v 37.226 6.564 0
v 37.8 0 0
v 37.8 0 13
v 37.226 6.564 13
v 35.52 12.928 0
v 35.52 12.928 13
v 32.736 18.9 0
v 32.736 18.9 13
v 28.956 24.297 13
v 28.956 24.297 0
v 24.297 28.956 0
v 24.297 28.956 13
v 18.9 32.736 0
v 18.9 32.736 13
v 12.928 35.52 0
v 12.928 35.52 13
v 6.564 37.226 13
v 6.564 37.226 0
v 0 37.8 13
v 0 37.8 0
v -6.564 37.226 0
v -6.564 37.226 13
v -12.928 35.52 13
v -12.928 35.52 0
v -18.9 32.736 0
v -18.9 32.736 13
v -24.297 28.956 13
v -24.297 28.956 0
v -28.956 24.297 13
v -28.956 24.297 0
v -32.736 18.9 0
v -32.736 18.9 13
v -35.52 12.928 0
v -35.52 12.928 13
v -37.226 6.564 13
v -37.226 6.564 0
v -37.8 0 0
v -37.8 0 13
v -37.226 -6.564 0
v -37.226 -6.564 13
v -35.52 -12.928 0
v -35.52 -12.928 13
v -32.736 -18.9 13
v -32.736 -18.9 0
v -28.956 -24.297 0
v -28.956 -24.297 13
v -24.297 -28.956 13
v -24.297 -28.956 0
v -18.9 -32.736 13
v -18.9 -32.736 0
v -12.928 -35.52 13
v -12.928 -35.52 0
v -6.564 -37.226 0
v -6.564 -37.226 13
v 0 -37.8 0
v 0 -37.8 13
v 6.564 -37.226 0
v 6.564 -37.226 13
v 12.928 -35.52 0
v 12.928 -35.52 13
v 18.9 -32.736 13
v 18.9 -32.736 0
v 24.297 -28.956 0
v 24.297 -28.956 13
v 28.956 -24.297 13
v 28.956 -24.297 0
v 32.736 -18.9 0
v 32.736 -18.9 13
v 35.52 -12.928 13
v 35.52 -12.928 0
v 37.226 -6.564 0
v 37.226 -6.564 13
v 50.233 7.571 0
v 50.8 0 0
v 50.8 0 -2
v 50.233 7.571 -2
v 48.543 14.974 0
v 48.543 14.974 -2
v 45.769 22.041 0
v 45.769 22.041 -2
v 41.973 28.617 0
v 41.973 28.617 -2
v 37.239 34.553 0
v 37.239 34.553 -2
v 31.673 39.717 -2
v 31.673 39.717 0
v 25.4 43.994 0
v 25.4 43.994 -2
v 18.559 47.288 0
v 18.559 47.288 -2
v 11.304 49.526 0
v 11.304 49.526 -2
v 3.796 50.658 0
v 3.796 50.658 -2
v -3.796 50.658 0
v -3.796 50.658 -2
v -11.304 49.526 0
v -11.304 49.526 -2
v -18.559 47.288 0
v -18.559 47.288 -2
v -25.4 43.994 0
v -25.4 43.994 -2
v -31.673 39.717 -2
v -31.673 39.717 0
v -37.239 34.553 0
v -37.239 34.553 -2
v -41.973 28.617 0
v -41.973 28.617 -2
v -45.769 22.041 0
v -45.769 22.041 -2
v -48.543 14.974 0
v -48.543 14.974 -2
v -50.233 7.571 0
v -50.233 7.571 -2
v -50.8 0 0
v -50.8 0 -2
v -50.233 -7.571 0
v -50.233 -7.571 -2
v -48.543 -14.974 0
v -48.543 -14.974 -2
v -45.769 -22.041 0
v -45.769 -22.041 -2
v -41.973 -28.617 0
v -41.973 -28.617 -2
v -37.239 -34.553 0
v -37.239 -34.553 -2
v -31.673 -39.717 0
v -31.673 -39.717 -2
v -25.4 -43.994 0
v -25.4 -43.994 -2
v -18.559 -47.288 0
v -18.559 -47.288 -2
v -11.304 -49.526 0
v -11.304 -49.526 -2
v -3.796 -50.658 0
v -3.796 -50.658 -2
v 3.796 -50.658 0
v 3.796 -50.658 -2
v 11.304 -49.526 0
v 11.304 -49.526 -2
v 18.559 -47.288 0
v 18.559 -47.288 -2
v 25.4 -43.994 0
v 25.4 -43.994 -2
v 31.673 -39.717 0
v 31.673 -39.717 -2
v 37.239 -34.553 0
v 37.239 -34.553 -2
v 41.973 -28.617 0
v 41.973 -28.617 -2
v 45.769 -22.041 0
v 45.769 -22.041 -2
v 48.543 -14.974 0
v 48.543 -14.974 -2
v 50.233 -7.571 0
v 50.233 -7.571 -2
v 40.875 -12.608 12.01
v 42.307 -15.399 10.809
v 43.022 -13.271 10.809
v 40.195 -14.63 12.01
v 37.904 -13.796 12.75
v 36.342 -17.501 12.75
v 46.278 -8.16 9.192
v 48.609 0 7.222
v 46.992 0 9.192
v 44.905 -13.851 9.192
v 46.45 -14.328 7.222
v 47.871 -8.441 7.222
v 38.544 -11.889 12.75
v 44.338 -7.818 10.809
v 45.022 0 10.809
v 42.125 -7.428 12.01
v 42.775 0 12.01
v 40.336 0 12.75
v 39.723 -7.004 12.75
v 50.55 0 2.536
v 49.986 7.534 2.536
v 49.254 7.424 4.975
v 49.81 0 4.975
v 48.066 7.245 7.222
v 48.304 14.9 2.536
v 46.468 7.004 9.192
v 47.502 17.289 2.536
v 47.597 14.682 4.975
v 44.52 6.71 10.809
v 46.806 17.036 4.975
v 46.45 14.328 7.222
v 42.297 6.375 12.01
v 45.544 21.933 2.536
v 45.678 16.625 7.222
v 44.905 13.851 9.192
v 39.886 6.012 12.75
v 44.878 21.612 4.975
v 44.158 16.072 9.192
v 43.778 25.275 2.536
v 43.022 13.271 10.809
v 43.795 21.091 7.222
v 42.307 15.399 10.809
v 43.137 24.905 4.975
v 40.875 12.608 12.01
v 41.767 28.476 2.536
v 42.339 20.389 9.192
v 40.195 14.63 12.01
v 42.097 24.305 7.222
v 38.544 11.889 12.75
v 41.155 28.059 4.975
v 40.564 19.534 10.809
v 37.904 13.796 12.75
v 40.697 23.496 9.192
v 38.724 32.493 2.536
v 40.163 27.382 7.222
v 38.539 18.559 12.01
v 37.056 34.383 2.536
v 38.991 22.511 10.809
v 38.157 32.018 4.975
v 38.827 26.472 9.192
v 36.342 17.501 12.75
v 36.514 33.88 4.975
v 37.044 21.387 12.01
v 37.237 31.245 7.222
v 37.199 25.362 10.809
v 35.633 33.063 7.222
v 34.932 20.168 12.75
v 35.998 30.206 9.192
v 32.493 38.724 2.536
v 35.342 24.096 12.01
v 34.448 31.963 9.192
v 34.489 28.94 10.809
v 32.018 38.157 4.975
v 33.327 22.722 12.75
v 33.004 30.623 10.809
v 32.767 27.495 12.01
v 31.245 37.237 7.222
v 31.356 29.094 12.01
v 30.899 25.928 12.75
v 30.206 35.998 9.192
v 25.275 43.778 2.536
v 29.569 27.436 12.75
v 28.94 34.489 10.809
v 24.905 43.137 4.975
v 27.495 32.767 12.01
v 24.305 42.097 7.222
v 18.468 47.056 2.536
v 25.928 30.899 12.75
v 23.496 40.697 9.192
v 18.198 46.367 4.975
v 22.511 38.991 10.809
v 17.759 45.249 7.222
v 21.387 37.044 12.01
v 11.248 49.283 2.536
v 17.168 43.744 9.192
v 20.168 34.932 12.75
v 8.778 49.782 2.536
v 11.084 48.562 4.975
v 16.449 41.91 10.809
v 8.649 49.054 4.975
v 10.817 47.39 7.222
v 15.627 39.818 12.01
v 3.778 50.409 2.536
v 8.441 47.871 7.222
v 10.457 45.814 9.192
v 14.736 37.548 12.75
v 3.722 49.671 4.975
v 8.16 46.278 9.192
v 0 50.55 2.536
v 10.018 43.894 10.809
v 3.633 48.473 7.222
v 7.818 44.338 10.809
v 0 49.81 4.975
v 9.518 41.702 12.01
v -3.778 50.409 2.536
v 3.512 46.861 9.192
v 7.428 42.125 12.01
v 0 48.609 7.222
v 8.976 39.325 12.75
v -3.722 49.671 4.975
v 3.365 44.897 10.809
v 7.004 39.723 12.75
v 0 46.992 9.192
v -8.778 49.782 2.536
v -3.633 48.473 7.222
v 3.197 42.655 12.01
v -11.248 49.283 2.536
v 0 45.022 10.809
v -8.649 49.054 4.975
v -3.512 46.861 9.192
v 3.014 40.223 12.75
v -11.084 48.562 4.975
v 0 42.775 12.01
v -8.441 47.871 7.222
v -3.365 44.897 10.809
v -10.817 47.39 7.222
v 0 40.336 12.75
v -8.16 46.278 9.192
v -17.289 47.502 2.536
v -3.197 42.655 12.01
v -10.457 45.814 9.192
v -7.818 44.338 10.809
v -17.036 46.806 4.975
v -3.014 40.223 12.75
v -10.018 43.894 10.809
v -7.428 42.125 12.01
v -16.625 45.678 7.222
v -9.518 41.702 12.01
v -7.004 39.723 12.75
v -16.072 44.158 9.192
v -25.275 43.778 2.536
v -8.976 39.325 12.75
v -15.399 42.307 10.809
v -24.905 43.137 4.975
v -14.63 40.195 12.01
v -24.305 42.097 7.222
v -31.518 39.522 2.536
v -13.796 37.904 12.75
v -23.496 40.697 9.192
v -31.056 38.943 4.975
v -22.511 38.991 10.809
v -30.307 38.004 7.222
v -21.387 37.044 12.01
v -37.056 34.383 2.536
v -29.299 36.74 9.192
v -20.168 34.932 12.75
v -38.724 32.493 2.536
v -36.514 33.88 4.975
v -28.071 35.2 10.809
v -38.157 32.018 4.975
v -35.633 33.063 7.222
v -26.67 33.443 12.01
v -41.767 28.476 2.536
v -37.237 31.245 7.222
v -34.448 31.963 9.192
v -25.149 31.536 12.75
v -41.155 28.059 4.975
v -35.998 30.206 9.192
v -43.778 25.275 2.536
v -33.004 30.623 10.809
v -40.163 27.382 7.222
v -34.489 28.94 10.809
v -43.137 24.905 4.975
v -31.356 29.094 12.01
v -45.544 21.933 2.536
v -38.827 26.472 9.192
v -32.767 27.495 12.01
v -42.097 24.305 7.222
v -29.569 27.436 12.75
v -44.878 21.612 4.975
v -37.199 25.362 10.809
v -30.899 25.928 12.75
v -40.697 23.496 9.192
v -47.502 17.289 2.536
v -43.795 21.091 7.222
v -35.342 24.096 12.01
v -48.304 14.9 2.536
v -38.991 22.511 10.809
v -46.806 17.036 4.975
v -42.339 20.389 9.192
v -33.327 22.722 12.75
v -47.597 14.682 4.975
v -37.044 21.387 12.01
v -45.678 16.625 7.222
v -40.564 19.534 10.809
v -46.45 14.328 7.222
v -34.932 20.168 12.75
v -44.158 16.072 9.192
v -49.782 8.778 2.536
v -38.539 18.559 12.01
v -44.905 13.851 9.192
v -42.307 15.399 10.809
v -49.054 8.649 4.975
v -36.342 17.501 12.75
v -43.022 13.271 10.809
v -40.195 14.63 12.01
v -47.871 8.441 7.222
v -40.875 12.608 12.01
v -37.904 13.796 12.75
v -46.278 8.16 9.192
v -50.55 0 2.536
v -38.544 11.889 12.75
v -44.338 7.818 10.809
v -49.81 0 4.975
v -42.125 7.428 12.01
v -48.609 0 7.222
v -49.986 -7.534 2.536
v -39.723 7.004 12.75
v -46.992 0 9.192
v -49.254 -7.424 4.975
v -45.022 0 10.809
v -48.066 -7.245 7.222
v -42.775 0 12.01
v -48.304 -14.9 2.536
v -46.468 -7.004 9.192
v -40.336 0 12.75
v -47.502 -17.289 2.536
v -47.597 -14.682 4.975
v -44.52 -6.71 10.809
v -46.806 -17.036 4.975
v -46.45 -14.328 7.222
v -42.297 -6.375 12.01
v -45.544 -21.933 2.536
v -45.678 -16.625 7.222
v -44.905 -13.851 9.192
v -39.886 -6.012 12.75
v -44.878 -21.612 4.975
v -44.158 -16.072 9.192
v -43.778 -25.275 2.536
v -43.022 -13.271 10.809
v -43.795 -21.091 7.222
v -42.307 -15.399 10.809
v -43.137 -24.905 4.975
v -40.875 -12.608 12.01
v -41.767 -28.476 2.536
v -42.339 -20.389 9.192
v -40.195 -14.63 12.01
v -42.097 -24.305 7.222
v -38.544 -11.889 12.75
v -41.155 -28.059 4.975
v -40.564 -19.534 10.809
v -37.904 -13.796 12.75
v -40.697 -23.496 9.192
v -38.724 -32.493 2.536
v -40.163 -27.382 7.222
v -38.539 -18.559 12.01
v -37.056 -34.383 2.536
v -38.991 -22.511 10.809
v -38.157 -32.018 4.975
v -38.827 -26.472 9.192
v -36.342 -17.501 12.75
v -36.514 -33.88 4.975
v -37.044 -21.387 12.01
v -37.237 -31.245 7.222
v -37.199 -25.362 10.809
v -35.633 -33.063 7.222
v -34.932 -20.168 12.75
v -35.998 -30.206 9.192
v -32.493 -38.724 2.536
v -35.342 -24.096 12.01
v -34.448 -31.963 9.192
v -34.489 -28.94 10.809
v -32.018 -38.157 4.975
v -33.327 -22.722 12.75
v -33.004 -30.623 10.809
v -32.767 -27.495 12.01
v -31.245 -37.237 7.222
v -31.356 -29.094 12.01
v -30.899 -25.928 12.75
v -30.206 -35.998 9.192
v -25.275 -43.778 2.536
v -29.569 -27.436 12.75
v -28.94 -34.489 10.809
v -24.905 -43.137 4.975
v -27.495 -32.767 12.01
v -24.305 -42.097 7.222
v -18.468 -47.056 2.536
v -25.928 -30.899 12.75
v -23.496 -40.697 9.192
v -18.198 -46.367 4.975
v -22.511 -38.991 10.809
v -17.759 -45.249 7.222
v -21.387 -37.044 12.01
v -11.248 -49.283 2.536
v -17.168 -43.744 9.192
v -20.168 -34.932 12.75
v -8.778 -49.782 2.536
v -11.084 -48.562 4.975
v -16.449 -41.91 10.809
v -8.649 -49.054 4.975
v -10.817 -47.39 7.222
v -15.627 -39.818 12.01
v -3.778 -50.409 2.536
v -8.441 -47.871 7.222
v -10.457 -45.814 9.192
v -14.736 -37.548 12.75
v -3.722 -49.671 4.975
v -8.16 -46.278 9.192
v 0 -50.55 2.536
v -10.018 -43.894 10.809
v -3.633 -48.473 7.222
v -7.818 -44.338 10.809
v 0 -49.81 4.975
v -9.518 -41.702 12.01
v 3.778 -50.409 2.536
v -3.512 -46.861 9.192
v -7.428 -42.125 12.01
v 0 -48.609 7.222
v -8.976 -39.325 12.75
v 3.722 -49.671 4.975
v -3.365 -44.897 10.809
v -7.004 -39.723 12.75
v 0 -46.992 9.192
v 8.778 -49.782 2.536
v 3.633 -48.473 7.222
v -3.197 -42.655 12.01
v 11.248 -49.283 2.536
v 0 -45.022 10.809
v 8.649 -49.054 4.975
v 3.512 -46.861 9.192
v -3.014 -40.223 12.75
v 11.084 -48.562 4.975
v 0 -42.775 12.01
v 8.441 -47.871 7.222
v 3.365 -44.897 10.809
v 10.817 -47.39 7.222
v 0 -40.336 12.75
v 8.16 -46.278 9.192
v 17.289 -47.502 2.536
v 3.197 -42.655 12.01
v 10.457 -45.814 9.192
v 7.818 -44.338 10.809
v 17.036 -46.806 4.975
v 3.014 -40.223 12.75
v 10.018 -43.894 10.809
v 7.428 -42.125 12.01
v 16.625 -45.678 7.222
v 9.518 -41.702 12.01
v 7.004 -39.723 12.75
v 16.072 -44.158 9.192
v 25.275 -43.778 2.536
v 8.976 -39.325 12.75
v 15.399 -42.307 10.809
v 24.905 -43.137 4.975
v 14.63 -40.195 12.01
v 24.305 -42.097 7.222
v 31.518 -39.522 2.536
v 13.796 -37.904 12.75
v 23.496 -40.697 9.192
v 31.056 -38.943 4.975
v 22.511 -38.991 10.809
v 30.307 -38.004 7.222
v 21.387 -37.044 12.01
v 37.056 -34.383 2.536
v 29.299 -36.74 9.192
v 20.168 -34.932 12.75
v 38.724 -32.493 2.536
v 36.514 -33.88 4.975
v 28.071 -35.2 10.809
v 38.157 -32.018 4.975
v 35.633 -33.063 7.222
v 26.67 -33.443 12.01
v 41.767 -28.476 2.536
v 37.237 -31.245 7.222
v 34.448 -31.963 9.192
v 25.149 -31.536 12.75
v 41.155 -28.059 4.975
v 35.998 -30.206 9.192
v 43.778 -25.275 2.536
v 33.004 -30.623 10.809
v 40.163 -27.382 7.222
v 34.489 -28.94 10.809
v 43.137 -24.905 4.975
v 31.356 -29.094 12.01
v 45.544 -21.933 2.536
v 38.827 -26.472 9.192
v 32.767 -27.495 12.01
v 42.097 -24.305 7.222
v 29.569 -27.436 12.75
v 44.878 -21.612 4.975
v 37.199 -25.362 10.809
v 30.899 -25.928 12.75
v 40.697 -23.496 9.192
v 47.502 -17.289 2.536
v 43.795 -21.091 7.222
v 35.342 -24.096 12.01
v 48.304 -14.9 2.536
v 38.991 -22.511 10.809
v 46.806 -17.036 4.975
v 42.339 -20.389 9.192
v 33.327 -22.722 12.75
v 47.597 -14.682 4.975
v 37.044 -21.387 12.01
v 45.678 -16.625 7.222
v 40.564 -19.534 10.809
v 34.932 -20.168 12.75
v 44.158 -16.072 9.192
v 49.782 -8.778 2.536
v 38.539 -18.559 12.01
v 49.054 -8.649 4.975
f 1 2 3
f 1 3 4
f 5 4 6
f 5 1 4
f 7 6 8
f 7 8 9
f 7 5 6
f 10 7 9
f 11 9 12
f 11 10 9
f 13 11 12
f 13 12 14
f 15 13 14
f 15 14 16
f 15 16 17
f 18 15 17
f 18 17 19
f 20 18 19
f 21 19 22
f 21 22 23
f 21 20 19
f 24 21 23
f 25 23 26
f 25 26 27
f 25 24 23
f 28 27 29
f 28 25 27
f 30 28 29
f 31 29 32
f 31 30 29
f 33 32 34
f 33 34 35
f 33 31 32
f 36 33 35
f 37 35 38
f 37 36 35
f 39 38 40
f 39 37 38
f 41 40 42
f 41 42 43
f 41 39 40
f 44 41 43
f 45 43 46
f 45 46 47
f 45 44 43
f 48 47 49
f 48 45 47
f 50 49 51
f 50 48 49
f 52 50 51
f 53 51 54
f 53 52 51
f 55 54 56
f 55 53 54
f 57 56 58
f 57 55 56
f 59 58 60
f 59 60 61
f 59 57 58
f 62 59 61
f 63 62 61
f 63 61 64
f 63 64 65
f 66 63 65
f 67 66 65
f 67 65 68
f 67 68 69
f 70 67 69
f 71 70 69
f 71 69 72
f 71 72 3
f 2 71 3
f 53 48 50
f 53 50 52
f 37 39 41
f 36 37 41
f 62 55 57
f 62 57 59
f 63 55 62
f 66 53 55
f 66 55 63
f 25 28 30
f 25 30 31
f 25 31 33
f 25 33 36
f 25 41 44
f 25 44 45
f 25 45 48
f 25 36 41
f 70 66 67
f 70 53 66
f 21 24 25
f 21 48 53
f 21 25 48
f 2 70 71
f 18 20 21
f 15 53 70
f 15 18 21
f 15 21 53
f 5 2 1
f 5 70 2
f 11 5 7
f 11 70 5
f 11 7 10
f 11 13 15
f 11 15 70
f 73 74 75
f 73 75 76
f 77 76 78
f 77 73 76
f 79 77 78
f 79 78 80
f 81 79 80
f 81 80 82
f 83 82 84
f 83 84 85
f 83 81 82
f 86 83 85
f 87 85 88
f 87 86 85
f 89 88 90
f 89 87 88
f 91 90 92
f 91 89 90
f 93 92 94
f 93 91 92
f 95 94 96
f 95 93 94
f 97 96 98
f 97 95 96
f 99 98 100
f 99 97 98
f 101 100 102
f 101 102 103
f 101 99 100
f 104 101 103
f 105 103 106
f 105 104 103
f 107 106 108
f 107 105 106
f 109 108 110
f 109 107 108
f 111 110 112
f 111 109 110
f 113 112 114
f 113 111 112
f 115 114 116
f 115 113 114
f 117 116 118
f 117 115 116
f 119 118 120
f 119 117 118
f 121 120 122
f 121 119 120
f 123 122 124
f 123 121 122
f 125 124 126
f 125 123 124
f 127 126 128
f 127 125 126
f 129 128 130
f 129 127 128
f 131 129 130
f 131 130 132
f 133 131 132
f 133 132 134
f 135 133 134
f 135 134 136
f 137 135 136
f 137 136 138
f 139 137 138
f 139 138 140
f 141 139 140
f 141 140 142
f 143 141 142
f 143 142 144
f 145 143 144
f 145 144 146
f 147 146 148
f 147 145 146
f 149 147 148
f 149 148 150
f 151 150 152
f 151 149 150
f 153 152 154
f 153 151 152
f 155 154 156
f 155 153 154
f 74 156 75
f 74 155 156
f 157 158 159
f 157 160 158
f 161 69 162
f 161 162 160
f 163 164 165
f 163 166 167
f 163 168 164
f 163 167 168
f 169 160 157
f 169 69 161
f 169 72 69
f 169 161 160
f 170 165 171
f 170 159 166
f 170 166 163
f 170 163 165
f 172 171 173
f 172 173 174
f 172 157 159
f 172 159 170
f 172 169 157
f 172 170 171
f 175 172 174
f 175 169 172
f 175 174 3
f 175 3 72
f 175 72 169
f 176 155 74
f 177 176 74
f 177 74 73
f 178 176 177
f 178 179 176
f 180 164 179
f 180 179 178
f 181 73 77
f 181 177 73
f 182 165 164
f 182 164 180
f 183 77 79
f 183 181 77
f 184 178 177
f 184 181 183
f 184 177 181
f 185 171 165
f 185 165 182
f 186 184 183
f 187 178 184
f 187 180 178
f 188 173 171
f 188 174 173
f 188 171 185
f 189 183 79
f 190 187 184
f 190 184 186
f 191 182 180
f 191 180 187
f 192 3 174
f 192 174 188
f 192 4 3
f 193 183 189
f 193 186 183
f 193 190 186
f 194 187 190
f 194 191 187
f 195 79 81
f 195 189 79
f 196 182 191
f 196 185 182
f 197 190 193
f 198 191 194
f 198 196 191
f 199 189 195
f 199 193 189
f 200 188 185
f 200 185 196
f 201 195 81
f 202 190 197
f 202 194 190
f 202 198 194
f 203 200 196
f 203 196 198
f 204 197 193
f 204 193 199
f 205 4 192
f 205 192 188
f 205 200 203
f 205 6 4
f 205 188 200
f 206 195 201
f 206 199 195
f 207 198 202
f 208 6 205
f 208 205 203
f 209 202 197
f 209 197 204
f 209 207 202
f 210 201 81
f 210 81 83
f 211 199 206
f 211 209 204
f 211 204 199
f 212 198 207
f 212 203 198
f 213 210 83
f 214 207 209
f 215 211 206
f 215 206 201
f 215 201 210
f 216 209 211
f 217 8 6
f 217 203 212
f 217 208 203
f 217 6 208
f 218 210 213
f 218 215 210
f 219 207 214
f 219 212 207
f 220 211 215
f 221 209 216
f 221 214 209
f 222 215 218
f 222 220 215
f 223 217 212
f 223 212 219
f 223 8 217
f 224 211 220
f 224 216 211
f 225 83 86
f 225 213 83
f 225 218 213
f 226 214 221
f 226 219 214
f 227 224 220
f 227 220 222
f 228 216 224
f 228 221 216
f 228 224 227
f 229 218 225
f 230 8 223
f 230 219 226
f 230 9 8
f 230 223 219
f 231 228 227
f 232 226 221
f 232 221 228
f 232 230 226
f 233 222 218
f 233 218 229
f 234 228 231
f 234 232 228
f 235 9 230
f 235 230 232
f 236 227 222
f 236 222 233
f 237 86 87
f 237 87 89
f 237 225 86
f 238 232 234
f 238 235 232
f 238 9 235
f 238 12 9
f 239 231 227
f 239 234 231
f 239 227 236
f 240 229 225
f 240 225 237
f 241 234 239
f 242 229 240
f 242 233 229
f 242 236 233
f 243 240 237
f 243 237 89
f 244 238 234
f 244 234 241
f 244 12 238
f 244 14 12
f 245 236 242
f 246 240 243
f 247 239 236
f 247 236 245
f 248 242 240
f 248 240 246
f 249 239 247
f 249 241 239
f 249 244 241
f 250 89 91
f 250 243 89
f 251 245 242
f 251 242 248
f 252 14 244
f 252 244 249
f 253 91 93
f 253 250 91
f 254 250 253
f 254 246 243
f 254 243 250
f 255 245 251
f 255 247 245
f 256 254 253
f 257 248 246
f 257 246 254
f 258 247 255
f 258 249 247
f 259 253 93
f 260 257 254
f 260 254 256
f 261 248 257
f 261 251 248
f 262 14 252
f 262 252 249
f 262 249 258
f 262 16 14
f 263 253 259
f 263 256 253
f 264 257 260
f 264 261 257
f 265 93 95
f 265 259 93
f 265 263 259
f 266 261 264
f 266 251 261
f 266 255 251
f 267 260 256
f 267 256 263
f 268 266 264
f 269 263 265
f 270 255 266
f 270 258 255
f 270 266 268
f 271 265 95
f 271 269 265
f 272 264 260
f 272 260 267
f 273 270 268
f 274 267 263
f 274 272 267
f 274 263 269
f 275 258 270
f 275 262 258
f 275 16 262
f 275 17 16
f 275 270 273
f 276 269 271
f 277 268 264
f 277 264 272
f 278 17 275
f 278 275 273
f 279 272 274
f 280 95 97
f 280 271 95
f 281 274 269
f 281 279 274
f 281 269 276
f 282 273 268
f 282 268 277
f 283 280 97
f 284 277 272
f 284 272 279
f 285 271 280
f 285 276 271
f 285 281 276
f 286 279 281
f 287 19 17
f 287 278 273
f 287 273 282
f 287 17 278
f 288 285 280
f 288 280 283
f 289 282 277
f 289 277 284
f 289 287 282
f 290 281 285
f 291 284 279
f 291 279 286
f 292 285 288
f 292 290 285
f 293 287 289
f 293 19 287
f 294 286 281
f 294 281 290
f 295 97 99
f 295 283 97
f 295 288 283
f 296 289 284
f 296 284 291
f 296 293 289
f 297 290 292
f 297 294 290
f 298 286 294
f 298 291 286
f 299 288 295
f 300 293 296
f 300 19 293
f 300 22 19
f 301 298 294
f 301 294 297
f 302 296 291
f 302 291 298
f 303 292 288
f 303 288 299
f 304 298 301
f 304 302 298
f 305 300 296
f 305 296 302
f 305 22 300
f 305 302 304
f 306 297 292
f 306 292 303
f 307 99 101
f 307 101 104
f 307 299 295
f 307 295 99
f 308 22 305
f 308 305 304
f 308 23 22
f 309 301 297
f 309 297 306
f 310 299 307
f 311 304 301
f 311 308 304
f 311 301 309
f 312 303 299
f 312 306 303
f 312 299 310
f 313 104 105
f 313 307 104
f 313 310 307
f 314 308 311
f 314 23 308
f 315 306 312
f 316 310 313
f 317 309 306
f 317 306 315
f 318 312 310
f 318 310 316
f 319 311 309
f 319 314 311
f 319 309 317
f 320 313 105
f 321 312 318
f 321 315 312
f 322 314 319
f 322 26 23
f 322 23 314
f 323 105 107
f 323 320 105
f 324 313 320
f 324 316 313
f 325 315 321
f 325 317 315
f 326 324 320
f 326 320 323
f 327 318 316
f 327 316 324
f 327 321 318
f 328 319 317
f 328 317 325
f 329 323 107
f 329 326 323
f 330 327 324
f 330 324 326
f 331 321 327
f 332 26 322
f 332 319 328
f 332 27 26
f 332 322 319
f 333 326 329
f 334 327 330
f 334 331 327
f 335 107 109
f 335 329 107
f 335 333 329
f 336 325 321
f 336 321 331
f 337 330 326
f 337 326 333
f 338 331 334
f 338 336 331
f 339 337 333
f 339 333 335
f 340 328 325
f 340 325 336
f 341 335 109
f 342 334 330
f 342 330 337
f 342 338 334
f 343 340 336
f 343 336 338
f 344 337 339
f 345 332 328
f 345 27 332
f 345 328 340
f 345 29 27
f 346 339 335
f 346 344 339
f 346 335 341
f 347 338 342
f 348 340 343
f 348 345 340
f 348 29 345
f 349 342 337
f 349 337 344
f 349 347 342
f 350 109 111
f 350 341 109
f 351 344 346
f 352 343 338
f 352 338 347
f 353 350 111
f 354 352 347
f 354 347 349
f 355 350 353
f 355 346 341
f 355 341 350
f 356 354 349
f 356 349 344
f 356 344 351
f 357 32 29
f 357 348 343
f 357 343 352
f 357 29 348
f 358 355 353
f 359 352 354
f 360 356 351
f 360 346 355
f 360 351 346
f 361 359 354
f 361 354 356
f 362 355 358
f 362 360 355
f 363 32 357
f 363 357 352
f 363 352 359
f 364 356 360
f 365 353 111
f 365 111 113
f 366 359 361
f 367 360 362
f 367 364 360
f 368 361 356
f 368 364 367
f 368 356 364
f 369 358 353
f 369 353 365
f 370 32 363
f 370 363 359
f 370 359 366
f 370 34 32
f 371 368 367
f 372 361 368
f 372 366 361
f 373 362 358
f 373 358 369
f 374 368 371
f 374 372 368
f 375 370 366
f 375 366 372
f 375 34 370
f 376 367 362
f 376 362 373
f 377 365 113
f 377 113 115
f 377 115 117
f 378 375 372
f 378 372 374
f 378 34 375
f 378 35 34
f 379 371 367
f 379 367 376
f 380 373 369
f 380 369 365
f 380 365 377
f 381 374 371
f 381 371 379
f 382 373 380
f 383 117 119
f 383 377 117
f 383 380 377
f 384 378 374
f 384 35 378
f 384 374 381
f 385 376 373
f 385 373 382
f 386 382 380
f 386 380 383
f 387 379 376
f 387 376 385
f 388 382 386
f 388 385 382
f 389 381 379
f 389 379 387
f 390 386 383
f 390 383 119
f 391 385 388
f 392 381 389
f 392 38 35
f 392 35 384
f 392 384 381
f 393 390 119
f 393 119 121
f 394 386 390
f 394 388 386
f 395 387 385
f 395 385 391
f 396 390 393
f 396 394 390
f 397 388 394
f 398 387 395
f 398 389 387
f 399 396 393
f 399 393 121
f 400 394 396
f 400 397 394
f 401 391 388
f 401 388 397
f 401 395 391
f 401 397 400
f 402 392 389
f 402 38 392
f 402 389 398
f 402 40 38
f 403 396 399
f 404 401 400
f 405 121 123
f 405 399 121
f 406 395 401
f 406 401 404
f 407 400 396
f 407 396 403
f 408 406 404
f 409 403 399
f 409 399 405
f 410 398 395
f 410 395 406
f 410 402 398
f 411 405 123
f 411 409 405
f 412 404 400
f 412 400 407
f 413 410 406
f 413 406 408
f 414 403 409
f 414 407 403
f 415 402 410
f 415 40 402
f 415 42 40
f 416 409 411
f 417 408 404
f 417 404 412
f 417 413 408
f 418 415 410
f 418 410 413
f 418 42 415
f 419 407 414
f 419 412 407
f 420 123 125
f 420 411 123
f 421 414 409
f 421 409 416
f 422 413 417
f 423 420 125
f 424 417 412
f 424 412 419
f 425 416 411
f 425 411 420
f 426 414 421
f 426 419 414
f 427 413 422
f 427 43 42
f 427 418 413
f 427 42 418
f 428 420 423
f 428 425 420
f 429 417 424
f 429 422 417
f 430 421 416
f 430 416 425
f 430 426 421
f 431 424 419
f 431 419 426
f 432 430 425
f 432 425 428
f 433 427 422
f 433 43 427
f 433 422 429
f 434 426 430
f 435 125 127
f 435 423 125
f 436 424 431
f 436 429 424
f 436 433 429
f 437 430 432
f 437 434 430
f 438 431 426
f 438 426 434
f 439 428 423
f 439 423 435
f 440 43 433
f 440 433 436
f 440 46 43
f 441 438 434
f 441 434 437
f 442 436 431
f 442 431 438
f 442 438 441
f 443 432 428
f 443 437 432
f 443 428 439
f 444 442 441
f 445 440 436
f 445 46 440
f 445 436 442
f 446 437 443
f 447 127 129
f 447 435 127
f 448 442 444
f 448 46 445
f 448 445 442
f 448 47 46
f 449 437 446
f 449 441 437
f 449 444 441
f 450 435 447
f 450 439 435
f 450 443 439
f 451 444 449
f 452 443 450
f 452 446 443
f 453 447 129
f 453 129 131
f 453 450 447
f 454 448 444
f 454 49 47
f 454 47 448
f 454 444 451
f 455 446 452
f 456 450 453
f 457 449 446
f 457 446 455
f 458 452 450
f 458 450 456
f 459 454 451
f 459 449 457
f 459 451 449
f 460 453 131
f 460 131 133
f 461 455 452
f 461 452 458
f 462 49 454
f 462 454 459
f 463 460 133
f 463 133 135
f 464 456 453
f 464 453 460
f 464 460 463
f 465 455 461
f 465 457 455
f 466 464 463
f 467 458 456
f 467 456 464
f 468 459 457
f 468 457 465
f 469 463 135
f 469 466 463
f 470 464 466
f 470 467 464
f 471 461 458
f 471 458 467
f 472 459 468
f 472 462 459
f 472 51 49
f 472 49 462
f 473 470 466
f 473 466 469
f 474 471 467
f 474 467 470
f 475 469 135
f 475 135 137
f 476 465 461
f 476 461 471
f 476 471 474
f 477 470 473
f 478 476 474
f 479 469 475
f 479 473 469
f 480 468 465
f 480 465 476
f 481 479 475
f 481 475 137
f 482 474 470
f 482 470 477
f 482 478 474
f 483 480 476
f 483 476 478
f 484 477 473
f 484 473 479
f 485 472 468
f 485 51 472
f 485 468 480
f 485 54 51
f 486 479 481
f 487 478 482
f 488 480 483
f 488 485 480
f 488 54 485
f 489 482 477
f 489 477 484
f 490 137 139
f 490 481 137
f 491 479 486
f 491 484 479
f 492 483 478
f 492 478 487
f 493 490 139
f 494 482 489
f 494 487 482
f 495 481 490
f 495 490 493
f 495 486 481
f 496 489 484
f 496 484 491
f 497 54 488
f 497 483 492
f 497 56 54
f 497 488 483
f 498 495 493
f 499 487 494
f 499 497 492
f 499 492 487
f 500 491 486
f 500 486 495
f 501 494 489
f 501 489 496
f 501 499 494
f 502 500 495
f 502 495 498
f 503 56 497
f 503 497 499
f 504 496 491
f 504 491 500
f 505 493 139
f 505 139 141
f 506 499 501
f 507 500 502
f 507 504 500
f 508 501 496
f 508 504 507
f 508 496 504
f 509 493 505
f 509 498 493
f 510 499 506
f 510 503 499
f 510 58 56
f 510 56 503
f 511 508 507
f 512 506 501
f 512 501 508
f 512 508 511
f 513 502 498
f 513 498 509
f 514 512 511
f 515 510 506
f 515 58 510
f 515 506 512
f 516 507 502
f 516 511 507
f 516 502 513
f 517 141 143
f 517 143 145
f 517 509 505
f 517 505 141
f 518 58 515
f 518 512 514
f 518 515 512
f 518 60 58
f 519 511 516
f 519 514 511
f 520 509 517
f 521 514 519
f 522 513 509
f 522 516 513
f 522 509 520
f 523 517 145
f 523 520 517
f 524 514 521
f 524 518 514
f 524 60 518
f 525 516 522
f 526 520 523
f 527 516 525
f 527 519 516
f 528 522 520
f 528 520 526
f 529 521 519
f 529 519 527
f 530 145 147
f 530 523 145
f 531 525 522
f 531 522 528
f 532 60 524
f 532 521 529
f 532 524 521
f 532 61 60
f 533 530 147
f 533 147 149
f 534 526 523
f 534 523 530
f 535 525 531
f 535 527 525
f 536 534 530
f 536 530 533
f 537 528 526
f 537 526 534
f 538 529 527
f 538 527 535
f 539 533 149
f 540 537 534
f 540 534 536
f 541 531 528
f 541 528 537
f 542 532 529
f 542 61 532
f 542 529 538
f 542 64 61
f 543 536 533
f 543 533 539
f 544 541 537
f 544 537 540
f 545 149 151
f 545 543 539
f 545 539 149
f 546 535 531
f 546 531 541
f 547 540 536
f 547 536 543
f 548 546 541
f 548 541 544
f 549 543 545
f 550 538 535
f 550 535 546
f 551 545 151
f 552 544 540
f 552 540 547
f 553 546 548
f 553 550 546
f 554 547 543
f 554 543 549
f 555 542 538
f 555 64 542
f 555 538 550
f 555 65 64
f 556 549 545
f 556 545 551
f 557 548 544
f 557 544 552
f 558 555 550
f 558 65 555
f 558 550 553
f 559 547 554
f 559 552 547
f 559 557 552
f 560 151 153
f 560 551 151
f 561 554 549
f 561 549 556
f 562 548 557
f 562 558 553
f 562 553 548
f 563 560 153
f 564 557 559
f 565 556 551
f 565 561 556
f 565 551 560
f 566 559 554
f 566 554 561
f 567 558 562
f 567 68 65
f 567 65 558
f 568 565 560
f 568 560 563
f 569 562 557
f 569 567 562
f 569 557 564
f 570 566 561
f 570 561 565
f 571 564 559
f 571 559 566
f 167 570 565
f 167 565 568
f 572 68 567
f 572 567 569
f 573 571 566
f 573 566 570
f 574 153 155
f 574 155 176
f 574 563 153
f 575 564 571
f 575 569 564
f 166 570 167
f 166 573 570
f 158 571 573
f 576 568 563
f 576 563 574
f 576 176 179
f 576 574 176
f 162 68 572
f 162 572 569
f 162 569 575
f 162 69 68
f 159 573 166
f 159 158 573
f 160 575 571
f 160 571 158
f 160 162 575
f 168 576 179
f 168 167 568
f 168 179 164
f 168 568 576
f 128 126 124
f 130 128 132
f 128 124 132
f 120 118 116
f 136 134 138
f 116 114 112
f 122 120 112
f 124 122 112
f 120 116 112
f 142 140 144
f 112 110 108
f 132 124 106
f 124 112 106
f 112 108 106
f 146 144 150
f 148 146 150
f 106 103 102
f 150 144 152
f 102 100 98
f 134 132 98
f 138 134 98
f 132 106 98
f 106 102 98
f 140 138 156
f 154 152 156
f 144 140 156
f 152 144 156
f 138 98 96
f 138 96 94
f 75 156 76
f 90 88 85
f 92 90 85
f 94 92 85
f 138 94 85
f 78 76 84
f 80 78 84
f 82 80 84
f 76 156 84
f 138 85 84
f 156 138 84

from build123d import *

# Parameters (mm, degrees)
F0_R     = 50.8
F0_R_2   = 37.8
F1_DEPTH = 2
F2_DEPTH = 13
F3_R     = 12.99999


# Not quite as in the source:
# - a fillet or chamfer is up to 0.001 mm smaller than in the source, because OpenCascade refuses the exact size


with BuildPart() as f1:
    # F0 (on Top) → F1 (new body)
    with BuildSketch(Plane.XY):
        Circle(F0_R)
        Circle(F0_R_2, mode=Mode.SUBTRACT)
        Circle(F0_R_2)
    extrude(amount=-F1_DEPTH)

    # F0 (on Top) → F2 (join)
    with BuildSketch(Plane.XY):
        Circle(F0_R)
        Circle(F0_R_2, mode=Mode.SUBTRACT)
    extrude(amount=F2_DEPTH)

    # F3 (radius 13 in the source; OpenCascade refuses exactly that, so slightly less here)
    f3_edges = [f1.edges().sort_by_distance(p)[0] for p in [
        (-50.8, 0, 13),
    ]]
    fillet(f3_edges, radius=F3_R)


solid = f1.part
